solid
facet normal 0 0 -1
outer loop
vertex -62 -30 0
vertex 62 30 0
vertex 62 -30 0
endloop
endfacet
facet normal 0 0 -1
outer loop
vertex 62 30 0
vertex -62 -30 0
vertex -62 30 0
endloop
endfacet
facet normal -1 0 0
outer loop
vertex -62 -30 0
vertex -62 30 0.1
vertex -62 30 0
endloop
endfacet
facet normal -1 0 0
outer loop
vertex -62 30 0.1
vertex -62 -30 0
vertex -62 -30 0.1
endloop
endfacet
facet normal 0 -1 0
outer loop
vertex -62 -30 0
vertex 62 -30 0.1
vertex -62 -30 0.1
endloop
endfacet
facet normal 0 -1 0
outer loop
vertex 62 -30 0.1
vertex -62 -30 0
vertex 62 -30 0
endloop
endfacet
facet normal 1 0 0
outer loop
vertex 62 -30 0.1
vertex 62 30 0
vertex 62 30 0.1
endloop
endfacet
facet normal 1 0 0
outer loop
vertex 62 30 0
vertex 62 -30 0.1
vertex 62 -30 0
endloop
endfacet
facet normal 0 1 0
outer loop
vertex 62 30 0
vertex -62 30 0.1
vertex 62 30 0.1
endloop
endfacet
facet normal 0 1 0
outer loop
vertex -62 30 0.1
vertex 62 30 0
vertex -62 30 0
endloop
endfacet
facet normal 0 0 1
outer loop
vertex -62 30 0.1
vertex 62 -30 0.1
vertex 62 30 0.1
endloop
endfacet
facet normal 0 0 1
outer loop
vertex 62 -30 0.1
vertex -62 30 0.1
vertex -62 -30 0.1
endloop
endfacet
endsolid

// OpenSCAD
// file: ../p/box5-12.scad
use <../lib.scad>
function ldraw_lib__box5_12() = [
// 0 Box with 5 Faces without Any Edges
// 0 Name: box5-12.dat
// 0 Author: Chris Dee [cwdee]
// 0 !LDRAW_ORG Primitive UPDATE 2009-02
// 0 !LICENSE Licensed under CC BY 2.0 and CC BY 4.0 : see CAreadme.txt
// 
// 0 BFC CERTIFY CCW
  [0,"BFC","CERTIFY"],
  [0,"BFC","CCW"],
// 
// 0 !HISTORY 2009-09-03 [PTadmin] Official Update 2009-02
// 
// 
// 4 16 1 1 1 1 1 -1 -1 1 -1 -1 1 1
  [4,16,1,1,1,1,1,-1,-1,1,-1,-1,1,1],
// 4 16 -1 0 1 1 0 1 1 1 1 -1 1 1
  [4,16,-1,0,1,1,0,1,1,1,1,-1,1,1],
// 4 16 -1 0 -1 -1 0 1 -1 1 1 -1 1 -1
  [4,16,-1,0,-1,-1,0,1,-1,1,1,-1,1,-1],
// 4 16 1 0 -1 -1 0 -1 -1 1 -1 1 1 -1
  [4,16,1,0,-1,-1,0,-1,-1,1,-1,1,1,-1],
// 4 16 1 0 1 1 0 -1 1 1 -1 1 1 1
  [4,16,1,0,1,1,0,-1,1,1,-1,1,1,1],
// 0
];
makepoly(ldraw_lib__box5_12(), line=0.2);
// main file
use <../lib.scad>
use <../p/box5-12.scad>
function ldraw_lib__6005049a() = [
// 0 Sticker  7.5 x 15.5 with UCS Executor Details
// 0 Name: 6005049a.dat
// 0 Author: Orion Pobursky [OrionP]
// 0 !LDRAW_ORG Part UPDATE 2022-02
// 0 !LICENSE Licensed under CC BY 2.0 and CC BY 4.0 : see CAreadme.txt
// 
// 0 BFC CERTIFY CCW
  [0,"BFC","CERTIFY"],
  [0,"BFC","CCW"],
// 
// 0 !KEYWORDS Set 10221
// 
// 0 !HISTORY 2022-03-06 [PTadmin] Official Update 2022-02
// 
// 
// 1 16 0 -0.25 0 0 0 -155 0 0.25 0 75 0 0 box5-12.dat
  [1,16,0,-0.25,0,0,0,-155,0,0.25,0,75,0,0, ldraw_lib__box5_12()],
// 0 !TEXMAP START PLANAR -155 -0.25 75 155 -0.25 75 -155 -0.25 -75 6005049a.png
// 0 !: 4 0 -155 -0.25 75 -155 -0.25 -75 155 -0.25 -75 155 -0.25 75
// 0 !TEXMAP FALLBACK
// 0 // Needs Work: fallback pattern
// 4 0 -155 -0.25 75 -155 -0.25 -75 155 -0.25 -75 155 -0.25 75
  [4,0,-155,-0.25,75,-155,-0.25,-75,155,-0.25,-75,155,-0.25,75],
// 0 !TEXMAP END
];
makepoly(ldraw_lib__6005049a(), line=0.2);
